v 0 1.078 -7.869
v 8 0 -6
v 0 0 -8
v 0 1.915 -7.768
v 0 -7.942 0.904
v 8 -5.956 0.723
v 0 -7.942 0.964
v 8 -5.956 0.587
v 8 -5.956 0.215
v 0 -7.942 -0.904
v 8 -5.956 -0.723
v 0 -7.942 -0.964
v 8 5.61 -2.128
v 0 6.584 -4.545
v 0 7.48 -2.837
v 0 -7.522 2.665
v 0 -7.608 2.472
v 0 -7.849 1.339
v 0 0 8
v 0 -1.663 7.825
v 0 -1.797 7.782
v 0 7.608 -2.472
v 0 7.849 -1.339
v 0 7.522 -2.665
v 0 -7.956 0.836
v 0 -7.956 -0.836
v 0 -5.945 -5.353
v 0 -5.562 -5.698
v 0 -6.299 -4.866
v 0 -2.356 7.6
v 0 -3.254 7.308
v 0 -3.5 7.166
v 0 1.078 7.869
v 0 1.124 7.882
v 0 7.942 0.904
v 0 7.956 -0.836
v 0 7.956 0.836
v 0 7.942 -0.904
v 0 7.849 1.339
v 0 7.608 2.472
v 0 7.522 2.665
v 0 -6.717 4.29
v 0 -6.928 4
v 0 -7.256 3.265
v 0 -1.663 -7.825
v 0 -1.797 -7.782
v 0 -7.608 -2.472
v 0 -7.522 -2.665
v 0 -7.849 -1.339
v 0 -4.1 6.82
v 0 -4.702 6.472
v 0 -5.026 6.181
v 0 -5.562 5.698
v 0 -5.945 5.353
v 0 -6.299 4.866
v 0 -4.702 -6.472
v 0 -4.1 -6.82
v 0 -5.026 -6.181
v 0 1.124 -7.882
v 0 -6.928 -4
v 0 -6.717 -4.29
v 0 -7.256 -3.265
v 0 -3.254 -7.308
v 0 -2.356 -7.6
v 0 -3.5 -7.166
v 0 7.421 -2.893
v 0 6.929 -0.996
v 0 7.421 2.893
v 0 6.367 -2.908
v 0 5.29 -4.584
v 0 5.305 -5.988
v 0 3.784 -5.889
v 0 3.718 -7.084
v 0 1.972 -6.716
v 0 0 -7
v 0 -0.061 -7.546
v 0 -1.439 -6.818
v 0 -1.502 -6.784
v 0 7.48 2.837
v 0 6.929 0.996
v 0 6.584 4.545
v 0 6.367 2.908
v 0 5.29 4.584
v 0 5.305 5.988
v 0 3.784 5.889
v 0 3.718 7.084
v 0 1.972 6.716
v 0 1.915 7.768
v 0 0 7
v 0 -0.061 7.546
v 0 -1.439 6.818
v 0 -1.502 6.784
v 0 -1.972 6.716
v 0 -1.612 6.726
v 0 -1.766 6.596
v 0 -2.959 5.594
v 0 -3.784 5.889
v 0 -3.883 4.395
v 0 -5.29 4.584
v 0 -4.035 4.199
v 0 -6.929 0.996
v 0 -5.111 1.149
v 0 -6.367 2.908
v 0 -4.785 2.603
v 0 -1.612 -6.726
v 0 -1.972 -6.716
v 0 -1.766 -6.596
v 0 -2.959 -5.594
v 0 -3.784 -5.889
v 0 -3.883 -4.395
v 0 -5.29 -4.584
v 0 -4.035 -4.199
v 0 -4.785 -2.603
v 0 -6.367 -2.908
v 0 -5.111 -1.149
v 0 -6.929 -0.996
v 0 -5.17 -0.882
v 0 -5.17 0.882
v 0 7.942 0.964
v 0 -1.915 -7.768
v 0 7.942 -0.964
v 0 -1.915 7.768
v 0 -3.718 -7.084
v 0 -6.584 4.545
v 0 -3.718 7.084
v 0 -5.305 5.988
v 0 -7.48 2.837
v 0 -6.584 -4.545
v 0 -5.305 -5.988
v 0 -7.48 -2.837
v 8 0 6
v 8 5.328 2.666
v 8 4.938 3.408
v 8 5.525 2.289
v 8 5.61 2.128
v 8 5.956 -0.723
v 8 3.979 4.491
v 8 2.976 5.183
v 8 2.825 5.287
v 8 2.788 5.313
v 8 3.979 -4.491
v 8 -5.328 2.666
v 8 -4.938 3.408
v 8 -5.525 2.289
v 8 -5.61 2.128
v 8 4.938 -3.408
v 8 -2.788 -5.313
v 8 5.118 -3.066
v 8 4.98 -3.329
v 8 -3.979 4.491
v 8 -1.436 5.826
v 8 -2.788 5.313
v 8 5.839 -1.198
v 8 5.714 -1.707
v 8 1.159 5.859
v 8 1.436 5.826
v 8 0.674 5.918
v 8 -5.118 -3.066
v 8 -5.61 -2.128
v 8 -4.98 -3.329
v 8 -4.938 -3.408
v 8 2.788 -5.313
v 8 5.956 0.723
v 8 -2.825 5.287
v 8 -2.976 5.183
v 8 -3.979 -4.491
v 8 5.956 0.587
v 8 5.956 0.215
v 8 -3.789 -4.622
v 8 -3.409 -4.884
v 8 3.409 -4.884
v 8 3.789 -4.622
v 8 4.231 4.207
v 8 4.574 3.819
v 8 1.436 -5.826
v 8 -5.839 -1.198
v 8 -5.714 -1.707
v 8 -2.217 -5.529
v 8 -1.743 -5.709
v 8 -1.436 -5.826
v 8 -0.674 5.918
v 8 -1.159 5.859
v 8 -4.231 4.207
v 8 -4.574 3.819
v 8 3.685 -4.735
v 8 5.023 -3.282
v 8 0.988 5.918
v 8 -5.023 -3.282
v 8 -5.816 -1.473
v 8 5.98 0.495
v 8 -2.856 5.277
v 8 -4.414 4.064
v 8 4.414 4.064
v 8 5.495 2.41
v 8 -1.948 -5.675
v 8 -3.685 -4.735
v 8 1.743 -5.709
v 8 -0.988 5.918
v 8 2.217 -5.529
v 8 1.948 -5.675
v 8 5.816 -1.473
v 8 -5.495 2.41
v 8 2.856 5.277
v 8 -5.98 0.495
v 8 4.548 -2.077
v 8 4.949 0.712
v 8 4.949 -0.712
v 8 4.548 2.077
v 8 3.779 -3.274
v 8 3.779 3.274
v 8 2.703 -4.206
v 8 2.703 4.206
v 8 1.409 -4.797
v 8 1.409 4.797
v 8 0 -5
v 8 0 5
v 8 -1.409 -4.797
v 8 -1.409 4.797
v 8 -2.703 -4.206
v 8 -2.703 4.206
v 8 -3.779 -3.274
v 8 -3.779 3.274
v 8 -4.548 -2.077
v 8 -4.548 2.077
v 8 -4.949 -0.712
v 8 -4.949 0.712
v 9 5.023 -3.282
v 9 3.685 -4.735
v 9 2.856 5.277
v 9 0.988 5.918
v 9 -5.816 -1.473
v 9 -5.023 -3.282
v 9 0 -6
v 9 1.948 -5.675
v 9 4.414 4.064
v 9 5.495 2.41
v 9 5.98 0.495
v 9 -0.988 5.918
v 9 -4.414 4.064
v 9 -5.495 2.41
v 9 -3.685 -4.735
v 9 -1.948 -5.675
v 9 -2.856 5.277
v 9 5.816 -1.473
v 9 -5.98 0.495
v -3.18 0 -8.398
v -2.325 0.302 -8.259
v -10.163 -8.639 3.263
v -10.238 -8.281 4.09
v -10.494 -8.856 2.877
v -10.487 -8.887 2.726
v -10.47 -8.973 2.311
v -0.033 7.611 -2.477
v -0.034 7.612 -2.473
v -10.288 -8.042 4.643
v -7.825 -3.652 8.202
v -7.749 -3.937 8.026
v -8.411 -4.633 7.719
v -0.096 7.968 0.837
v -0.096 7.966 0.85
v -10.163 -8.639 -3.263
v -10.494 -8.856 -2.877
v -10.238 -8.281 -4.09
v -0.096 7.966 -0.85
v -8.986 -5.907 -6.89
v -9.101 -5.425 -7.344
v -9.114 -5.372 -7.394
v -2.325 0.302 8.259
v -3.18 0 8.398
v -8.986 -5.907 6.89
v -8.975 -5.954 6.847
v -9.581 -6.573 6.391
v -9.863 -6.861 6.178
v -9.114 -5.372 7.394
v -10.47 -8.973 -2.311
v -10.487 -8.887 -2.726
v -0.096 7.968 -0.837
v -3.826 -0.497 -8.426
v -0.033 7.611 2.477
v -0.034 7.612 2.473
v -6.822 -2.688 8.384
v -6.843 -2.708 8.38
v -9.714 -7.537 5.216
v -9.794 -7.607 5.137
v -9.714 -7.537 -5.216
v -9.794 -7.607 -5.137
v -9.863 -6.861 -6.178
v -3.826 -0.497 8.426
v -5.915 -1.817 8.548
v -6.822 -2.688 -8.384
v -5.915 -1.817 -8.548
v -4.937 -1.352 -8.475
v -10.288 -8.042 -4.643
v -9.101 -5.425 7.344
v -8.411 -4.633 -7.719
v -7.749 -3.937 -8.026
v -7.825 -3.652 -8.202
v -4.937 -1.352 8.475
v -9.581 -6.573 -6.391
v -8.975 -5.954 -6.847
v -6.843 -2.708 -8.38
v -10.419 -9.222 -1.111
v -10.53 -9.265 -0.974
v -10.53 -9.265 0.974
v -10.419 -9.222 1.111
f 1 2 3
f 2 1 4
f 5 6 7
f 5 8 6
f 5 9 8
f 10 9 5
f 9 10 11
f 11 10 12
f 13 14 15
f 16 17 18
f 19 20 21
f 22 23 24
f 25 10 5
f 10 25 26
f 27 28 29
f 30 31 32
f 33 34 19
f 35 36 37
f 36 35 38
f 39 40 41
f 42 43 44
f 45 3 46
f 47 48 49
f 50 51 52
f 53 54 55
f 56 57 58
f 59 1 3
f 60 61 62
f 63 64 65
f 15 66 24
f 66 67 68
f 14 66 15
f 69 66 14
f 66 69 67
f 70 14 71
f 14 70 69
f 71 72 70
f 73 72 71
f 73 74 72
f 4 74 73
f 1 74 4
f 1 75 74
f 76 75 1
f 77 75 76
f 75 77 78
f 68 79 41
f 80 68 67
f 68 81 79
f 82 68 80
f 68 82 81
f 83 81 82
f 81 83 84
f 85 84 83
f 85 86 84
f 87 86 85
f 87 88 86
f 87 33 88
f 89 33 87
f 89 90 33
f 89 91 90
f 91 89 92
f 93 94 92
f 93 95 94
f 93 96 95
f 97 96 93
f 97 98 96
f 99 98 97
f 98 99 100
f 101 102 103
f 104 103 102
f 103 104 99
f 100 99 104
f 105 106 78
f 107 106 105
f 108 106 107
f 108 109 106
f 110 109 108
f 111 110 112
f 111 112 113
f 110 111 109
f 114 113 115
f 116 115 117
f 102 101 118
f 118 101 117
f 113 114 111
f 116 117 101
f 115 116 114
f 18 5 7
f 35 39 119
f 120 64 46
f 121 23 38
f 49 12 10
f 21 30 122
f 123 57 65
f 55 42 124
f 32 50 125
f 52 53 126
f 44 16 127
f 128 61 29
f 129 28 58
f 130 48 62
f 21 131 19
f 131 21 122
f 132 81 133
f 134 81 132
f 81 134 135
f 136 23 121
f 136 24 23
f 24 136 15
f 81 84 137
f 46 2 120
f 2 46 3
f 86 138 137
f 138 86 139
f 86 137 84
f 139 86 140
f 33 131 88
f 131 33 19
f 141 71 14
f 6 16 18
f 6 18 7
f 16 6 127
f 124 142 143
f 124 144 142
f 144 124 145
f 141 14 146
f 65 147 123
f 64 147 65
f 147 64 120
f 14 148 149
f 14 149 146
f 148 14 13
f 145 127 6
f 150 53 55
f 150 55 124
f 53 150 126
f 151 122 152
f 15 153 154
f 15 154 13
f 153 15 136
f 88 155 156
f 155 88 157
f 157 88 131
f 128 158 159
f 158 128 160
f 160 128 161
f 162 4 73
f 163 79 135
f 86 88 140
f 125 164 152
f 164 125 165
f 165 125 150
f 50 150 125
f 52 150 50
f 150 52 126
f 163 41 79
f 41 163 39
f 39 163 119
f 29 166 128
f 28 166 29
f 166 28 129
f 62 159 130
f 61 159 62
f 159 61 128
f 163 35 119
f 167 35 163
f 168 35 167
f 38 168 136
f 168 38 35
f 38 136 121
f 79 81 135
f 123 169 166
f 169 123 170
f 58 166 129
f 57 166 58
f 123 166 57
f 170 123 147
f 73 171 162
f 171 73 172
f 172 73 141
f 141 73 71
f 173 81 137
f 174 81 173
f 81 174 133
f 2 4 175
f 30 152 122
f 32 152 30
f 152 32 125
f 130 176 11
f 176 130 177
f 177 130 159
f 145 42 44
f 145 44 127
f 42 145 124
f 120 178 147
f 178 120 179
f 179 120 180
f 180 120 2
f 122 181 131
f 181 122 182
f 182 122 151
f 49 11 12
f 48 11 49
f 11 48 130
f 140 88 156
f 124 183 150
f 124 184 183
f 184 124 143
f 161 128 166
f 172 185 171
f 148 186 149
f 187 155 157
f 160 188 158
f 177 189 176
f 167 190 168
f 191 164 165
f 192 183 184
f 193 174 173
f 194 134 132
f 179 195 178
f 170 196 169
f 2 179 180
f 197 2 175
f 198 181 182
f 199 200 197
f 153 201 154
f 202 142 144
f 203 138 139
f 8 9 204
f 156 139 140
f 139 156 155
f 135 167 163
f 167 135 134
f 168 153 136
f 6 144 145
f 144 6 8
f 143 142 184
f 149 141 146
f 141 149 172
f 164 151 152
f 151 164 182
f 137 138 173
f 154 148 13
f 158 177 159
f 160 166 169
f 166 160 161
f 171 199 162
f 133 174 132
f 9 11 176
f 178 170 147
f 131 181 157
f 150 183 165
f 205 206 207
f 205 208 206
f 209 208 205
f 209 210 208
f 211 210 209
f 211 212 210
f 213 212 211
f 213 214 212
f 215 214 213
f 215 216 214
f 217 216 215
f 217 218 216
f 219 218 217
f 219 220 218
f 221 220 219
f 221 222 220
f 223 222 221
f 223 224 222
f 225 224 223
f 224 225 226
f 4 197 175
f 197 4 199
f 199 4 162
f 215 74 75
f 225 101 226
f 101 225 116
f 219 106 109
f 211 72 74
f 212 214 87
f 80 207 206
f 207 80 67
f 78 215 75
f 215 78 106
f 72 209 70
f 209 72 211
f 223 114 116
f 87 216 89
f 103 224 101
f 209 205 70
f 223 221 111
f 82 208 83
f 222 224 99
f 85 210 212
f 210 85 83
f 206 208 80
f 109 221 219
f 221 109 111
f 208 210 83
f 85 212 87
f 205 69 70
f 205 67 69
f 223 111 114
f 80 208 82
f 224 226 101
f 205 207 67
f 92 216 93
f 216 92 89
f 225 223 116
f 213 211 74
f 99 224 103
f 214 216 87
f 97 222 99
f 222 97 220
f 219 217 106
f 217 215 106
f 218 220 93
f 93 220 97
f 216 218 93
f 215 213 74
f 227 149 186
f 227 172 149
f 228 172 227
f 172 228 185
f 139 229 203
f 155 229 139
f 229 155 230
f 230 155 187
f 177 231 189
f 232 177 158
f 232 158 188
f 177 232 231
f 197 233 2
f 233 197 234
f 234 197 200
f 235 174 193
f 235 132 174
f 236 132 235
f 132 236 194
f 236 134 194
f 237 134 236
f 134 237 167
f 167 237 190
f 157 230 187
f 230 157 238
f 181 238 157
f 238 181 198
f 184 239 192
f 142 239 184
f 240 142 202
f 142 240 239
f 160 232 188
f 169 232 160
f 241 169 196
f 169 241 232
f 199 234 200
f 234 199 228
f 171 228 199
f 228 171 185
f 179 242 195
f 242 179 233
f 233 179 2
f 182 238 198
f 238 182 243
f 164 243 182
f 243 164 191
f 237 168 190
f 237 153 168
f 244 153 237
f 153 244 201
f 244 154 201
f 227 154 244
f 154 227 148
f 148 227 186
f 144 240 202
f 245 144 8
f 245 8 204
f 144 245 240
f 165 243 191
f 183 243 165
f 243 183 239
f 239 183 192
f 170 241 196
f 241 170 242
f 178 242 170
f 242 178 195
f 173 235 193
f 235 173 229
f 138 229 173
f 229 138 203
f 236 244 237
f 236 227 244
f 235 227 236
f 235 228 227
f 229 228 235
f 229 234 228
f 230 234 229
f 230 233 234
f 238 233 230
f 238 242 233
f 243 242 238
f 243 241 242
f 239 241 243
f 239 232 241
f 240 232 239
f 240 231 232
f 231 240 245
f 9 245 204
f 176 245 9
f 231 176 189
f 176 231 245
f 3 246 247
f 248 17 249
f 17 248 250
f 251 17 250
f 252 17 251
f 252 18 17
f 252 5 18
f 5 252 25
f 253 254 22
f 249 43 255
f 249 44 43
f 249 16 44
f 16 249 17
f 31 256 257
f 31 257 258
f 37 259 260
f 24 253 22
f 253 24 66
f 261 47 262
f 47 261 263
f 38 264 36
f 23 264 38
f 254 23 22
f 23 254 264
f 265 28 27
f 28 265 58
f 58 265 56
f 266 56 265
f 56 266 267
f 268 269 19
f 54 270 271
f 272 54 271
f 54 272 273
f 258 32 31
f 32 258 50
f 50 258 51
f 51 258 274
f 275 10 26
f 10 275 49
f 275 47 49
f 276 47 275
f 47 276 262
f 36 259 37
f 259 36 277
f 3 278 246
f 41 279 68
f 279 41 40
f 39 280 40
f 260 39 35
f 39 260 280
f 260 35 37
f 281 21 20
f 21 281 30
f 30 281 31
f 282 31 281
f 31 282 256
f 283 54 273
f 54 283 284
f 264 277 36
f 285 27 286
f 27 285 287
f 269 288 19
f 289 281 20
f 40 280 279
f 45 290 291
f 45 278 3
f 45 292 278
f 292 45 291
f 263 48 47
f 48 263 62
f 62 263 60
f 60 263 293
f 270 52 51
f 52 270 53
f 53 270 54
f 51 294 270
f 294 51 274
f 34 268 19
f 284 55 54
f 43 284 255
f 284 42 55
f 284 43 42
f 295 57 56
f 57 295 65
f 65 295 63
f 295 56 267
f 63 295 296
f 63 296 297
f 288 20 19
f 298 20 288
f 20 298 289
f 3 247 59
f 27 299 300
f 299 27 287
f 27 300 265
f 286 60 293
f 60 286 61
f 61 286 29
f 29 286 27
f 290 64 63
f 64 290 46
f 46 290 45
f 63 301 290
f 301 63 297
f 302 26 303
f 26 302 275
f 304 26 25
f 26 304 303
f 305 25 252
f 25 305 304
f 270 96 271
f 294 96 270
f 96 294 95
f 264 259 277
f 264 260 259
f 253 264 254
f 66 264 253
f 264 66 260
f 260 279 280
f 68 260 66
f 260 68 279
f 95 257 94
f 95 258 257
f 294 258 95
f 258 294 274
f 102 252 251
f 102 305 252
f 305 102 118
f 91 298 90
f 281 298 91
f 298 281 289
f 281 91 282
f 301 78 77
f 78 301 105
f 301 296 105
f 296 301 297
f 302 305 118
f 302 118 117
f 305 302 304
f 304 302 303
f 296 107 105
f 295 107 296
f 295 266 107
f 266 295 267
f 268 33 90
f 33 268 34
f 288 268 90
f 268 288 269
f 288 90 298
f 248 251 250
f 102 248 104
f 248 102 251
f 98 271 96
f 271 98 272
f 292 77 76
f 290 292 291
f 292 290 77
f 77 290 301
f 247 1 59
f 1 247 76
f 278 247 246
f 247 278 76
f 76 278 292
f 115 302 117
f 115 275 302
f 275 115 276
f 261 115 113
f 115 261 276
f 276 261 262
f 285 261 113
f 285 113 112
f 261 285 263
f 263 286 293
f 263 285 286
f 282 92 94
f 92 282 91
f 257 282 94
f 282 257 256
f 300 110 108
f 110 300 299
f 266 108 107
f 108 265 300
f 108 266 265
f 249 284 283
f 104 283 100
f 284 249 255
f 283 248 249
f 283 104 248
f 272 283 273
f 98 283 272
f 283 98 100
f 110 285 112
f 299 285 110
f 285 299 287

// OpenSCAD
//goggles
//union(){}
//intersection(){

//cylinder(height, r1, r2, center=true/false)

union(){
translate([8,0,0]) rotate([90,90,90]) cylinder(1,6,6);
difference(){
translate([0,0,0]) rotate([90,90,90]) cylinder(8,8,6);
translate([0,0,0]) rotate([90,90,90]) cylinder(8,7,5);
}
}

translate([-16,0,0])difference(){
translate([0,0,0]) rotate([90,90,90]) cylinder(16,10,8);
translate([-3,0,0]) rotate([80,90,90]) cylinder(20,12,8);
}
